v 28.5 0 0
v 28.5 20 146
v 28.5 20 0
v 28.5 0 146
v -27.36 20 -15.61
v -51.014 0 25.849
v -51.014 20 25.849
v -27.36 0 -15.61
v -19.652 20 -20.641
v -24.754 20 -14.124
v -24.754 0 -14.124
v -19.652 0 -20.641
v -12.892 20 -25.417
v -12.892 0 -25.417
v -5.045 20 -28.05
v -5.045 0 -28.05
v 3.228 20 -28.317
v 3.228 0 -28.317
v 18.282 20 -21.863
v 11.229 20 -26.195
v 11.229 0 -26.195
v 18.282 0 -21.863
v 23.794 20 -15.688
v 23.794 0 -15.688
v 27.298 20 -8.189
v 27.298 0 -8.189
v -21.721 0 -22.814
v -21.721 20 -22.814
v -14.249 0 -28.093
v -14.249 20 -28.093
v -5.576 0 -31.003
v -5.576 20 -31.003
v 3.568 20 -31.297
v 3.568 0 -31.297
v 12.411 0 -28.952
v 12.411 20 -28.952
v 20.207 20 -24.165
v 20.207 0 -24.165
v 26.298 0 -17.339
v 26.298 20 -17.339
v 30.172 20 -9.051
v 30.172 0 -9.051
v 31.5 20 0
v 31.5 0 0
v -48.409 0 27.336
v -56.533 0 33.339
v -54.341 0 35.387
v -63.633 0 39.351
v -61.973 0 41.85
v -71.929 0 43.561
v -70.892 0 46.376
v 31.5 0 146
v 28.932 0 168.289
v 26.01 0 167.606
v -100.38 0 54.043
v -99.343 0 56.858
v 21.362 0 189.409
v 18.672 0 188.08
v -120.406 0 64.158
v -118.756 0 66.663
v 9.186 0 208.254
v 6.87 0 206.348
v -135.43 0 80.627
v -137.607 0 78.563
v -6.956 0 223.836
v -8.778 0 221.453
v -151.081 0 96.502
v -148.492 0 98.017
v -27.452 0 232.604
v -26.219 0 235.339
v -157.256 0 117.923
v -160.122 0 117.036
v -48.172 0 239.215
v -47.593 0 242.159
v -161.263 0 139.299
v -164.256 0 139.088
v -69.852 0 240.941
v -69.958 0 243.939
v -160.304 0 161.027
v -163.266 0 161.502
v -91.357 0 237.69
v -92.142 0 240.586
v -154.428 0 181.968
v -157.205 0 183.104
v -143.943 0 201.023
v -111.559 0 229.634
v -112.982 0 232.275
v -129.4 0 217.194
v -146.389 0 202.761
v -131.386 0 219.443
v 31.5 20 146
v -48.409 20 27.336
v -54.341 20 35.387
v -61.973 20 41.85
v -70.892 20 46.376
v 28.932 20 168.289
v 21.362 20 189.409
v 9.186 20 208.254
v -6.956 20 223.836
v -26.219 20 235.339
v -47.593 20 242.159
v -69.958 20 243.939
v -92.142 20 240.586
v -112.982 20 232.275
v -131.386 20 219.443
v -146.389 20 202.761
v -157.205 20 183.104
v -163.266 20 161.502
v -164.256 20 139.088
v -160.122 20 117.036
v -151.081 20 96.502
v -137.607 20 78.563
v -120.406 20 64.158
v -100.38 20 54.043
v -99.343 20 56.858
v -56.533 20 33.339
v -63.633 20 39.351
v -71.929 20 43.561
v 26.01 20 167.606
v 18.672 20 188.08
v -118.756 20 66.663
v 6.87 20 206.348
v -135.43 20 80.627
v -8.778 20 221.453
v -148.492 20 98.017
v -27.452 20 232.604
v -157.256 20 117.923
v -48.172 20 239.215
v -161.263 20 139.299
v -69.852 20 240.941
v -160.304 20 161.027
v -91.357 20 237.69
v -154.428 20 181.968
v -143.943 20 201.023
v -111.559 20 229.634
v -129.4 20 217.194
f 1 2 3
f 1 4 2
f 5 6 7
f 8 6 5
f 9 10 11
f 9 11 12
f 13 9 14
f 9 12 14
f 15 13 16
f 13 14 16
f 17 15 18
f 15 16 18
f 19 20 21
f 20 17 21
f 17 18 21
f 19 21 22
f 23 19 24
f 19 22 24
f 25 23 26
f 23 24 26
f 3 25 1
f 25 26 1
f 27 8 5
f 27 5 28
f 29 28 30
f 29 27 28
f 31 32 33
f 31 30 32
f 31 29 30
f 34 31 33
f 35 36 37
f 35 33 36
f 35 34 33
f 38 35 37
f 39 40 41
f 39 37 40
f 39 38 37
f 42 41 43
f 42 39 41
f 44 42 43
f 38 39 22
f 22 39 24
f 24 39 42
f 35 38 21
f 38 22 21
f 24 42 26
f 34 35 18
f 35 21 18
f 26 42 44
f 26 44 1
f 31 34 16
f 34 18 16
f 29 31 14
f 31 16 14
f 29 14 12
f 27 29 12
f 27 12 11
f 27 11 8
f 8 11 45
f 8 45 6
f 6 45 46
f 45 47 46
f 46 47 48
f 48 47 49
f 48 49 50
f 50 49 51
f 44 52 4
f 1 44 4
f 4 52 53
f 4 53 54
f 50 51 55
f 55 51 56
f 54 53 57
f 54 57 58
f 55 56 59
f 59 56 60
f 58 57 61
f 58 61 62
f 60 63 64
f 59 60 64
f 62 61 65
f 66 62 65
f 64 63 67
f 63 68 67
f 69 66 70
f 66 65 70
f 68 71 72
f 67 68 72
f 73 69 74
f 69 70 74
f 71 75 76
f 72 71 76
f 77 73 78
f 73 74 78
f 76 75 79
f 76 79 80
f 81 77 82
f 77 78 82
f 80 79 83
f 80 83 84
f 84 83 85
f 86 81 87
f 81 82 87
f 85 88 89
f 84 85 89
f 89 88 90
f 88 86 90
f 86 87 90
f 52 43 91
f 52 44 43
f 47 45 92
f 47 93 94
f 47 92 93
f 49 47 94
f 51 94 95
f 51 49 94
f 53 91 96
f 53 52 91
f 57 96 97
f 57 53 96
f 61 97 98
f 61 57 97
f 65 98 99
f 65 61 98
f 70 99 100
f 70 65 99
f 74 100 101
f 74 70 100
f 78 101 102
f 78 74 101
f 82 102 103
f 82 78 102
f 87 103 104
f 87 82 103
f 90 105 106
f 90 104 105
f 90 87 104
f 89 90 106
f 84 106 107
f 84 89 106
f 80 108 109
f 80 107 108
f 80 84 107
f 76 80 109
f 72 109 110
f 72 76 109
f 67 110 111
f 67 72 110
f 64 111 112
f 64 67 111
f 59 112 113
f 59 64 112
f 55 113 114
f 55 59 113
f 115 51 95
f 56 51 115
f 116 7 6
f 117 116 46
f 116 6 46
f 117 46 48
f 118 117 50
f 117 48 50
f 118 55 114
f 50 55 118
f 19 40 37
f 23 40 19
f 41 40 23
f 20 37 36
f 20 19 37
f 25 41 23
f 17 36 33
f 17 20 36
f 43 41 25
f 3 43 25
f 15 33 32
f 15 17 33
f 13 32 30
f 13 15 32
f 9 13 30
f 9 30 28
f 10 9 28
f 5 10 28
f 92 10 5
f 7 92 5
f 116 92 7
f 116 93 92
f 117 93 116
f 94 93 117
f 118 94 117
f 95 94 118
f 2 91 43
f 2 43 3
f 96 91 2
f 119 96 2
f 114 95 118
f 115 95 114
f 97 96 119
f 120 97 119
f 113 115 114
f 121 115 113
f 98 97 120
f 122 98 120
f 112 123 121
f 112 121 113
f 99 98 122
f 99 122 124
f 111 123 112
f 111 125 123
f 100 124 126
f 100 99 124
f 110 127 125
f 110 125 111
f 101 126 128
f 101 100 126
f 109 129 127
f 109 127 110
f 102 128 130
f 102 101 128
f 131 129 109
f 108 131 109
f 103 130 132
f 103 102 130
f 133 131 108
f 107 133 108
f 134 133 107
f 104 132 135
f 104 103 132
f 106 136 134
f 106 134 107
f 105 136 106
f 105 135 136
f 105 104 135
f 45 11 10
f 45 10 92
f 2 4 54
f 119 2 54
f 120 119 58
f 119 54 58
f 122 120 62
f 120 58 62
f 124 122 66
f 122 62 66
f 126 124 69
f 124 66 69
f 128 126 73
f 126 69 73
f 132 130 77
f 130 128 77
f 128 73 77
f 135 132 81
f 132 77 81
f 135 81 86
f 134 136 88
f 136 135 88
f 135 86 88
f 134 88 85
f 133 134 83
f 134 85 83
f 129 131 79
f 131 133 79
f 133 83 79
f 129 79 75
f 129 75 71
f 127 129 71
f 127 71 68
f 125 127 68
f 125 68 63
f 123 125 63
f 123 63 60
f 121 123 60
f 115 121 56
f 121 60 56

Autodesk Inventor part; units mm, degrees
ref_plane "YZ Plane" through (0, 0, 0) normal (1, 0, 0) x (0, 1, 0)
ref_plane "XZ Plane" through (0, 0, 0) normal (0, 1, 0) x (-1, 0, 0)
ref_plane "XY Plane" through (0, 0, 0) normal (0, 0, 1) x (1, 0, 0)
sketch "Sketch1" plane through (0, 0, 0) normal (0, 1, 0) x (-1, 0, 0)
  line L0 (70.8919, 46.3756) -> (99.3426, 56.8576)
  line L1 (24.7543, -14.1235) -> (48.4088, 27.336)
  line L2 (-28.5, 146) -> (-28.5, 0)
  line L3 (51.0145, 25.8493) -> (27.3601, -15.6101)
  line L4 (100.3797, 54.0426) -> (71.929, 43.5606)
  line L5 (-31.5, 0) -> (-31.5, 146)
  arc A0 (99.3426, 56.8576) -> (-28.5, 146) centre (66.5, 146) ccw
  arc A1 (70.8919, 46.3756) -> (48.4088, 27.336) centre (85.7575, 6.0269) ccw
  arc A2 (-28.5, 0) -> (24.7543, -14.1235) centre (0, 0) ccw
  arc A3 (-31.5, 0) -> (27.3601, -15.6101) centre (0, 0) ccw
  arc A4 (71.929, 43.5606) -> (51.0145, 25.8493) centre (85.7575, 6.0269) ccw
  arc A5 (100.3797, 54.0426) -> (-31.5, 146) centre (66.5, 146) ccw
  dimension "d0" = 95
  dimension "d1" = 40
  dimension "d2" = 28.5
  dimension "d3" = 31.5
  dimension "d4" = 146
  dimension "d5" = 146
  dimension "d6" = 98
  dimension "d7" = 95
  dimension "d8" = 146
  dimension "d9" = 66.5
  dimension "d10" = 47.7328
  dimension "d11" = 53.2544
  dimension "d12" = 43
  dimension "d13" = 58.8601
  dimension "d14" = 47.7328
  dimension "d15" = 91.9574
  dimension "d16" = 139.9731
  dimension "d17" = 85.7575
  dimension "d18" = 150.293
  dimension "d19" = 0
  dimension "d20" = 0
extrude "Extrusion1" add sketch "Sketch1" along normal blind 20
properties part number "50-01-001"
